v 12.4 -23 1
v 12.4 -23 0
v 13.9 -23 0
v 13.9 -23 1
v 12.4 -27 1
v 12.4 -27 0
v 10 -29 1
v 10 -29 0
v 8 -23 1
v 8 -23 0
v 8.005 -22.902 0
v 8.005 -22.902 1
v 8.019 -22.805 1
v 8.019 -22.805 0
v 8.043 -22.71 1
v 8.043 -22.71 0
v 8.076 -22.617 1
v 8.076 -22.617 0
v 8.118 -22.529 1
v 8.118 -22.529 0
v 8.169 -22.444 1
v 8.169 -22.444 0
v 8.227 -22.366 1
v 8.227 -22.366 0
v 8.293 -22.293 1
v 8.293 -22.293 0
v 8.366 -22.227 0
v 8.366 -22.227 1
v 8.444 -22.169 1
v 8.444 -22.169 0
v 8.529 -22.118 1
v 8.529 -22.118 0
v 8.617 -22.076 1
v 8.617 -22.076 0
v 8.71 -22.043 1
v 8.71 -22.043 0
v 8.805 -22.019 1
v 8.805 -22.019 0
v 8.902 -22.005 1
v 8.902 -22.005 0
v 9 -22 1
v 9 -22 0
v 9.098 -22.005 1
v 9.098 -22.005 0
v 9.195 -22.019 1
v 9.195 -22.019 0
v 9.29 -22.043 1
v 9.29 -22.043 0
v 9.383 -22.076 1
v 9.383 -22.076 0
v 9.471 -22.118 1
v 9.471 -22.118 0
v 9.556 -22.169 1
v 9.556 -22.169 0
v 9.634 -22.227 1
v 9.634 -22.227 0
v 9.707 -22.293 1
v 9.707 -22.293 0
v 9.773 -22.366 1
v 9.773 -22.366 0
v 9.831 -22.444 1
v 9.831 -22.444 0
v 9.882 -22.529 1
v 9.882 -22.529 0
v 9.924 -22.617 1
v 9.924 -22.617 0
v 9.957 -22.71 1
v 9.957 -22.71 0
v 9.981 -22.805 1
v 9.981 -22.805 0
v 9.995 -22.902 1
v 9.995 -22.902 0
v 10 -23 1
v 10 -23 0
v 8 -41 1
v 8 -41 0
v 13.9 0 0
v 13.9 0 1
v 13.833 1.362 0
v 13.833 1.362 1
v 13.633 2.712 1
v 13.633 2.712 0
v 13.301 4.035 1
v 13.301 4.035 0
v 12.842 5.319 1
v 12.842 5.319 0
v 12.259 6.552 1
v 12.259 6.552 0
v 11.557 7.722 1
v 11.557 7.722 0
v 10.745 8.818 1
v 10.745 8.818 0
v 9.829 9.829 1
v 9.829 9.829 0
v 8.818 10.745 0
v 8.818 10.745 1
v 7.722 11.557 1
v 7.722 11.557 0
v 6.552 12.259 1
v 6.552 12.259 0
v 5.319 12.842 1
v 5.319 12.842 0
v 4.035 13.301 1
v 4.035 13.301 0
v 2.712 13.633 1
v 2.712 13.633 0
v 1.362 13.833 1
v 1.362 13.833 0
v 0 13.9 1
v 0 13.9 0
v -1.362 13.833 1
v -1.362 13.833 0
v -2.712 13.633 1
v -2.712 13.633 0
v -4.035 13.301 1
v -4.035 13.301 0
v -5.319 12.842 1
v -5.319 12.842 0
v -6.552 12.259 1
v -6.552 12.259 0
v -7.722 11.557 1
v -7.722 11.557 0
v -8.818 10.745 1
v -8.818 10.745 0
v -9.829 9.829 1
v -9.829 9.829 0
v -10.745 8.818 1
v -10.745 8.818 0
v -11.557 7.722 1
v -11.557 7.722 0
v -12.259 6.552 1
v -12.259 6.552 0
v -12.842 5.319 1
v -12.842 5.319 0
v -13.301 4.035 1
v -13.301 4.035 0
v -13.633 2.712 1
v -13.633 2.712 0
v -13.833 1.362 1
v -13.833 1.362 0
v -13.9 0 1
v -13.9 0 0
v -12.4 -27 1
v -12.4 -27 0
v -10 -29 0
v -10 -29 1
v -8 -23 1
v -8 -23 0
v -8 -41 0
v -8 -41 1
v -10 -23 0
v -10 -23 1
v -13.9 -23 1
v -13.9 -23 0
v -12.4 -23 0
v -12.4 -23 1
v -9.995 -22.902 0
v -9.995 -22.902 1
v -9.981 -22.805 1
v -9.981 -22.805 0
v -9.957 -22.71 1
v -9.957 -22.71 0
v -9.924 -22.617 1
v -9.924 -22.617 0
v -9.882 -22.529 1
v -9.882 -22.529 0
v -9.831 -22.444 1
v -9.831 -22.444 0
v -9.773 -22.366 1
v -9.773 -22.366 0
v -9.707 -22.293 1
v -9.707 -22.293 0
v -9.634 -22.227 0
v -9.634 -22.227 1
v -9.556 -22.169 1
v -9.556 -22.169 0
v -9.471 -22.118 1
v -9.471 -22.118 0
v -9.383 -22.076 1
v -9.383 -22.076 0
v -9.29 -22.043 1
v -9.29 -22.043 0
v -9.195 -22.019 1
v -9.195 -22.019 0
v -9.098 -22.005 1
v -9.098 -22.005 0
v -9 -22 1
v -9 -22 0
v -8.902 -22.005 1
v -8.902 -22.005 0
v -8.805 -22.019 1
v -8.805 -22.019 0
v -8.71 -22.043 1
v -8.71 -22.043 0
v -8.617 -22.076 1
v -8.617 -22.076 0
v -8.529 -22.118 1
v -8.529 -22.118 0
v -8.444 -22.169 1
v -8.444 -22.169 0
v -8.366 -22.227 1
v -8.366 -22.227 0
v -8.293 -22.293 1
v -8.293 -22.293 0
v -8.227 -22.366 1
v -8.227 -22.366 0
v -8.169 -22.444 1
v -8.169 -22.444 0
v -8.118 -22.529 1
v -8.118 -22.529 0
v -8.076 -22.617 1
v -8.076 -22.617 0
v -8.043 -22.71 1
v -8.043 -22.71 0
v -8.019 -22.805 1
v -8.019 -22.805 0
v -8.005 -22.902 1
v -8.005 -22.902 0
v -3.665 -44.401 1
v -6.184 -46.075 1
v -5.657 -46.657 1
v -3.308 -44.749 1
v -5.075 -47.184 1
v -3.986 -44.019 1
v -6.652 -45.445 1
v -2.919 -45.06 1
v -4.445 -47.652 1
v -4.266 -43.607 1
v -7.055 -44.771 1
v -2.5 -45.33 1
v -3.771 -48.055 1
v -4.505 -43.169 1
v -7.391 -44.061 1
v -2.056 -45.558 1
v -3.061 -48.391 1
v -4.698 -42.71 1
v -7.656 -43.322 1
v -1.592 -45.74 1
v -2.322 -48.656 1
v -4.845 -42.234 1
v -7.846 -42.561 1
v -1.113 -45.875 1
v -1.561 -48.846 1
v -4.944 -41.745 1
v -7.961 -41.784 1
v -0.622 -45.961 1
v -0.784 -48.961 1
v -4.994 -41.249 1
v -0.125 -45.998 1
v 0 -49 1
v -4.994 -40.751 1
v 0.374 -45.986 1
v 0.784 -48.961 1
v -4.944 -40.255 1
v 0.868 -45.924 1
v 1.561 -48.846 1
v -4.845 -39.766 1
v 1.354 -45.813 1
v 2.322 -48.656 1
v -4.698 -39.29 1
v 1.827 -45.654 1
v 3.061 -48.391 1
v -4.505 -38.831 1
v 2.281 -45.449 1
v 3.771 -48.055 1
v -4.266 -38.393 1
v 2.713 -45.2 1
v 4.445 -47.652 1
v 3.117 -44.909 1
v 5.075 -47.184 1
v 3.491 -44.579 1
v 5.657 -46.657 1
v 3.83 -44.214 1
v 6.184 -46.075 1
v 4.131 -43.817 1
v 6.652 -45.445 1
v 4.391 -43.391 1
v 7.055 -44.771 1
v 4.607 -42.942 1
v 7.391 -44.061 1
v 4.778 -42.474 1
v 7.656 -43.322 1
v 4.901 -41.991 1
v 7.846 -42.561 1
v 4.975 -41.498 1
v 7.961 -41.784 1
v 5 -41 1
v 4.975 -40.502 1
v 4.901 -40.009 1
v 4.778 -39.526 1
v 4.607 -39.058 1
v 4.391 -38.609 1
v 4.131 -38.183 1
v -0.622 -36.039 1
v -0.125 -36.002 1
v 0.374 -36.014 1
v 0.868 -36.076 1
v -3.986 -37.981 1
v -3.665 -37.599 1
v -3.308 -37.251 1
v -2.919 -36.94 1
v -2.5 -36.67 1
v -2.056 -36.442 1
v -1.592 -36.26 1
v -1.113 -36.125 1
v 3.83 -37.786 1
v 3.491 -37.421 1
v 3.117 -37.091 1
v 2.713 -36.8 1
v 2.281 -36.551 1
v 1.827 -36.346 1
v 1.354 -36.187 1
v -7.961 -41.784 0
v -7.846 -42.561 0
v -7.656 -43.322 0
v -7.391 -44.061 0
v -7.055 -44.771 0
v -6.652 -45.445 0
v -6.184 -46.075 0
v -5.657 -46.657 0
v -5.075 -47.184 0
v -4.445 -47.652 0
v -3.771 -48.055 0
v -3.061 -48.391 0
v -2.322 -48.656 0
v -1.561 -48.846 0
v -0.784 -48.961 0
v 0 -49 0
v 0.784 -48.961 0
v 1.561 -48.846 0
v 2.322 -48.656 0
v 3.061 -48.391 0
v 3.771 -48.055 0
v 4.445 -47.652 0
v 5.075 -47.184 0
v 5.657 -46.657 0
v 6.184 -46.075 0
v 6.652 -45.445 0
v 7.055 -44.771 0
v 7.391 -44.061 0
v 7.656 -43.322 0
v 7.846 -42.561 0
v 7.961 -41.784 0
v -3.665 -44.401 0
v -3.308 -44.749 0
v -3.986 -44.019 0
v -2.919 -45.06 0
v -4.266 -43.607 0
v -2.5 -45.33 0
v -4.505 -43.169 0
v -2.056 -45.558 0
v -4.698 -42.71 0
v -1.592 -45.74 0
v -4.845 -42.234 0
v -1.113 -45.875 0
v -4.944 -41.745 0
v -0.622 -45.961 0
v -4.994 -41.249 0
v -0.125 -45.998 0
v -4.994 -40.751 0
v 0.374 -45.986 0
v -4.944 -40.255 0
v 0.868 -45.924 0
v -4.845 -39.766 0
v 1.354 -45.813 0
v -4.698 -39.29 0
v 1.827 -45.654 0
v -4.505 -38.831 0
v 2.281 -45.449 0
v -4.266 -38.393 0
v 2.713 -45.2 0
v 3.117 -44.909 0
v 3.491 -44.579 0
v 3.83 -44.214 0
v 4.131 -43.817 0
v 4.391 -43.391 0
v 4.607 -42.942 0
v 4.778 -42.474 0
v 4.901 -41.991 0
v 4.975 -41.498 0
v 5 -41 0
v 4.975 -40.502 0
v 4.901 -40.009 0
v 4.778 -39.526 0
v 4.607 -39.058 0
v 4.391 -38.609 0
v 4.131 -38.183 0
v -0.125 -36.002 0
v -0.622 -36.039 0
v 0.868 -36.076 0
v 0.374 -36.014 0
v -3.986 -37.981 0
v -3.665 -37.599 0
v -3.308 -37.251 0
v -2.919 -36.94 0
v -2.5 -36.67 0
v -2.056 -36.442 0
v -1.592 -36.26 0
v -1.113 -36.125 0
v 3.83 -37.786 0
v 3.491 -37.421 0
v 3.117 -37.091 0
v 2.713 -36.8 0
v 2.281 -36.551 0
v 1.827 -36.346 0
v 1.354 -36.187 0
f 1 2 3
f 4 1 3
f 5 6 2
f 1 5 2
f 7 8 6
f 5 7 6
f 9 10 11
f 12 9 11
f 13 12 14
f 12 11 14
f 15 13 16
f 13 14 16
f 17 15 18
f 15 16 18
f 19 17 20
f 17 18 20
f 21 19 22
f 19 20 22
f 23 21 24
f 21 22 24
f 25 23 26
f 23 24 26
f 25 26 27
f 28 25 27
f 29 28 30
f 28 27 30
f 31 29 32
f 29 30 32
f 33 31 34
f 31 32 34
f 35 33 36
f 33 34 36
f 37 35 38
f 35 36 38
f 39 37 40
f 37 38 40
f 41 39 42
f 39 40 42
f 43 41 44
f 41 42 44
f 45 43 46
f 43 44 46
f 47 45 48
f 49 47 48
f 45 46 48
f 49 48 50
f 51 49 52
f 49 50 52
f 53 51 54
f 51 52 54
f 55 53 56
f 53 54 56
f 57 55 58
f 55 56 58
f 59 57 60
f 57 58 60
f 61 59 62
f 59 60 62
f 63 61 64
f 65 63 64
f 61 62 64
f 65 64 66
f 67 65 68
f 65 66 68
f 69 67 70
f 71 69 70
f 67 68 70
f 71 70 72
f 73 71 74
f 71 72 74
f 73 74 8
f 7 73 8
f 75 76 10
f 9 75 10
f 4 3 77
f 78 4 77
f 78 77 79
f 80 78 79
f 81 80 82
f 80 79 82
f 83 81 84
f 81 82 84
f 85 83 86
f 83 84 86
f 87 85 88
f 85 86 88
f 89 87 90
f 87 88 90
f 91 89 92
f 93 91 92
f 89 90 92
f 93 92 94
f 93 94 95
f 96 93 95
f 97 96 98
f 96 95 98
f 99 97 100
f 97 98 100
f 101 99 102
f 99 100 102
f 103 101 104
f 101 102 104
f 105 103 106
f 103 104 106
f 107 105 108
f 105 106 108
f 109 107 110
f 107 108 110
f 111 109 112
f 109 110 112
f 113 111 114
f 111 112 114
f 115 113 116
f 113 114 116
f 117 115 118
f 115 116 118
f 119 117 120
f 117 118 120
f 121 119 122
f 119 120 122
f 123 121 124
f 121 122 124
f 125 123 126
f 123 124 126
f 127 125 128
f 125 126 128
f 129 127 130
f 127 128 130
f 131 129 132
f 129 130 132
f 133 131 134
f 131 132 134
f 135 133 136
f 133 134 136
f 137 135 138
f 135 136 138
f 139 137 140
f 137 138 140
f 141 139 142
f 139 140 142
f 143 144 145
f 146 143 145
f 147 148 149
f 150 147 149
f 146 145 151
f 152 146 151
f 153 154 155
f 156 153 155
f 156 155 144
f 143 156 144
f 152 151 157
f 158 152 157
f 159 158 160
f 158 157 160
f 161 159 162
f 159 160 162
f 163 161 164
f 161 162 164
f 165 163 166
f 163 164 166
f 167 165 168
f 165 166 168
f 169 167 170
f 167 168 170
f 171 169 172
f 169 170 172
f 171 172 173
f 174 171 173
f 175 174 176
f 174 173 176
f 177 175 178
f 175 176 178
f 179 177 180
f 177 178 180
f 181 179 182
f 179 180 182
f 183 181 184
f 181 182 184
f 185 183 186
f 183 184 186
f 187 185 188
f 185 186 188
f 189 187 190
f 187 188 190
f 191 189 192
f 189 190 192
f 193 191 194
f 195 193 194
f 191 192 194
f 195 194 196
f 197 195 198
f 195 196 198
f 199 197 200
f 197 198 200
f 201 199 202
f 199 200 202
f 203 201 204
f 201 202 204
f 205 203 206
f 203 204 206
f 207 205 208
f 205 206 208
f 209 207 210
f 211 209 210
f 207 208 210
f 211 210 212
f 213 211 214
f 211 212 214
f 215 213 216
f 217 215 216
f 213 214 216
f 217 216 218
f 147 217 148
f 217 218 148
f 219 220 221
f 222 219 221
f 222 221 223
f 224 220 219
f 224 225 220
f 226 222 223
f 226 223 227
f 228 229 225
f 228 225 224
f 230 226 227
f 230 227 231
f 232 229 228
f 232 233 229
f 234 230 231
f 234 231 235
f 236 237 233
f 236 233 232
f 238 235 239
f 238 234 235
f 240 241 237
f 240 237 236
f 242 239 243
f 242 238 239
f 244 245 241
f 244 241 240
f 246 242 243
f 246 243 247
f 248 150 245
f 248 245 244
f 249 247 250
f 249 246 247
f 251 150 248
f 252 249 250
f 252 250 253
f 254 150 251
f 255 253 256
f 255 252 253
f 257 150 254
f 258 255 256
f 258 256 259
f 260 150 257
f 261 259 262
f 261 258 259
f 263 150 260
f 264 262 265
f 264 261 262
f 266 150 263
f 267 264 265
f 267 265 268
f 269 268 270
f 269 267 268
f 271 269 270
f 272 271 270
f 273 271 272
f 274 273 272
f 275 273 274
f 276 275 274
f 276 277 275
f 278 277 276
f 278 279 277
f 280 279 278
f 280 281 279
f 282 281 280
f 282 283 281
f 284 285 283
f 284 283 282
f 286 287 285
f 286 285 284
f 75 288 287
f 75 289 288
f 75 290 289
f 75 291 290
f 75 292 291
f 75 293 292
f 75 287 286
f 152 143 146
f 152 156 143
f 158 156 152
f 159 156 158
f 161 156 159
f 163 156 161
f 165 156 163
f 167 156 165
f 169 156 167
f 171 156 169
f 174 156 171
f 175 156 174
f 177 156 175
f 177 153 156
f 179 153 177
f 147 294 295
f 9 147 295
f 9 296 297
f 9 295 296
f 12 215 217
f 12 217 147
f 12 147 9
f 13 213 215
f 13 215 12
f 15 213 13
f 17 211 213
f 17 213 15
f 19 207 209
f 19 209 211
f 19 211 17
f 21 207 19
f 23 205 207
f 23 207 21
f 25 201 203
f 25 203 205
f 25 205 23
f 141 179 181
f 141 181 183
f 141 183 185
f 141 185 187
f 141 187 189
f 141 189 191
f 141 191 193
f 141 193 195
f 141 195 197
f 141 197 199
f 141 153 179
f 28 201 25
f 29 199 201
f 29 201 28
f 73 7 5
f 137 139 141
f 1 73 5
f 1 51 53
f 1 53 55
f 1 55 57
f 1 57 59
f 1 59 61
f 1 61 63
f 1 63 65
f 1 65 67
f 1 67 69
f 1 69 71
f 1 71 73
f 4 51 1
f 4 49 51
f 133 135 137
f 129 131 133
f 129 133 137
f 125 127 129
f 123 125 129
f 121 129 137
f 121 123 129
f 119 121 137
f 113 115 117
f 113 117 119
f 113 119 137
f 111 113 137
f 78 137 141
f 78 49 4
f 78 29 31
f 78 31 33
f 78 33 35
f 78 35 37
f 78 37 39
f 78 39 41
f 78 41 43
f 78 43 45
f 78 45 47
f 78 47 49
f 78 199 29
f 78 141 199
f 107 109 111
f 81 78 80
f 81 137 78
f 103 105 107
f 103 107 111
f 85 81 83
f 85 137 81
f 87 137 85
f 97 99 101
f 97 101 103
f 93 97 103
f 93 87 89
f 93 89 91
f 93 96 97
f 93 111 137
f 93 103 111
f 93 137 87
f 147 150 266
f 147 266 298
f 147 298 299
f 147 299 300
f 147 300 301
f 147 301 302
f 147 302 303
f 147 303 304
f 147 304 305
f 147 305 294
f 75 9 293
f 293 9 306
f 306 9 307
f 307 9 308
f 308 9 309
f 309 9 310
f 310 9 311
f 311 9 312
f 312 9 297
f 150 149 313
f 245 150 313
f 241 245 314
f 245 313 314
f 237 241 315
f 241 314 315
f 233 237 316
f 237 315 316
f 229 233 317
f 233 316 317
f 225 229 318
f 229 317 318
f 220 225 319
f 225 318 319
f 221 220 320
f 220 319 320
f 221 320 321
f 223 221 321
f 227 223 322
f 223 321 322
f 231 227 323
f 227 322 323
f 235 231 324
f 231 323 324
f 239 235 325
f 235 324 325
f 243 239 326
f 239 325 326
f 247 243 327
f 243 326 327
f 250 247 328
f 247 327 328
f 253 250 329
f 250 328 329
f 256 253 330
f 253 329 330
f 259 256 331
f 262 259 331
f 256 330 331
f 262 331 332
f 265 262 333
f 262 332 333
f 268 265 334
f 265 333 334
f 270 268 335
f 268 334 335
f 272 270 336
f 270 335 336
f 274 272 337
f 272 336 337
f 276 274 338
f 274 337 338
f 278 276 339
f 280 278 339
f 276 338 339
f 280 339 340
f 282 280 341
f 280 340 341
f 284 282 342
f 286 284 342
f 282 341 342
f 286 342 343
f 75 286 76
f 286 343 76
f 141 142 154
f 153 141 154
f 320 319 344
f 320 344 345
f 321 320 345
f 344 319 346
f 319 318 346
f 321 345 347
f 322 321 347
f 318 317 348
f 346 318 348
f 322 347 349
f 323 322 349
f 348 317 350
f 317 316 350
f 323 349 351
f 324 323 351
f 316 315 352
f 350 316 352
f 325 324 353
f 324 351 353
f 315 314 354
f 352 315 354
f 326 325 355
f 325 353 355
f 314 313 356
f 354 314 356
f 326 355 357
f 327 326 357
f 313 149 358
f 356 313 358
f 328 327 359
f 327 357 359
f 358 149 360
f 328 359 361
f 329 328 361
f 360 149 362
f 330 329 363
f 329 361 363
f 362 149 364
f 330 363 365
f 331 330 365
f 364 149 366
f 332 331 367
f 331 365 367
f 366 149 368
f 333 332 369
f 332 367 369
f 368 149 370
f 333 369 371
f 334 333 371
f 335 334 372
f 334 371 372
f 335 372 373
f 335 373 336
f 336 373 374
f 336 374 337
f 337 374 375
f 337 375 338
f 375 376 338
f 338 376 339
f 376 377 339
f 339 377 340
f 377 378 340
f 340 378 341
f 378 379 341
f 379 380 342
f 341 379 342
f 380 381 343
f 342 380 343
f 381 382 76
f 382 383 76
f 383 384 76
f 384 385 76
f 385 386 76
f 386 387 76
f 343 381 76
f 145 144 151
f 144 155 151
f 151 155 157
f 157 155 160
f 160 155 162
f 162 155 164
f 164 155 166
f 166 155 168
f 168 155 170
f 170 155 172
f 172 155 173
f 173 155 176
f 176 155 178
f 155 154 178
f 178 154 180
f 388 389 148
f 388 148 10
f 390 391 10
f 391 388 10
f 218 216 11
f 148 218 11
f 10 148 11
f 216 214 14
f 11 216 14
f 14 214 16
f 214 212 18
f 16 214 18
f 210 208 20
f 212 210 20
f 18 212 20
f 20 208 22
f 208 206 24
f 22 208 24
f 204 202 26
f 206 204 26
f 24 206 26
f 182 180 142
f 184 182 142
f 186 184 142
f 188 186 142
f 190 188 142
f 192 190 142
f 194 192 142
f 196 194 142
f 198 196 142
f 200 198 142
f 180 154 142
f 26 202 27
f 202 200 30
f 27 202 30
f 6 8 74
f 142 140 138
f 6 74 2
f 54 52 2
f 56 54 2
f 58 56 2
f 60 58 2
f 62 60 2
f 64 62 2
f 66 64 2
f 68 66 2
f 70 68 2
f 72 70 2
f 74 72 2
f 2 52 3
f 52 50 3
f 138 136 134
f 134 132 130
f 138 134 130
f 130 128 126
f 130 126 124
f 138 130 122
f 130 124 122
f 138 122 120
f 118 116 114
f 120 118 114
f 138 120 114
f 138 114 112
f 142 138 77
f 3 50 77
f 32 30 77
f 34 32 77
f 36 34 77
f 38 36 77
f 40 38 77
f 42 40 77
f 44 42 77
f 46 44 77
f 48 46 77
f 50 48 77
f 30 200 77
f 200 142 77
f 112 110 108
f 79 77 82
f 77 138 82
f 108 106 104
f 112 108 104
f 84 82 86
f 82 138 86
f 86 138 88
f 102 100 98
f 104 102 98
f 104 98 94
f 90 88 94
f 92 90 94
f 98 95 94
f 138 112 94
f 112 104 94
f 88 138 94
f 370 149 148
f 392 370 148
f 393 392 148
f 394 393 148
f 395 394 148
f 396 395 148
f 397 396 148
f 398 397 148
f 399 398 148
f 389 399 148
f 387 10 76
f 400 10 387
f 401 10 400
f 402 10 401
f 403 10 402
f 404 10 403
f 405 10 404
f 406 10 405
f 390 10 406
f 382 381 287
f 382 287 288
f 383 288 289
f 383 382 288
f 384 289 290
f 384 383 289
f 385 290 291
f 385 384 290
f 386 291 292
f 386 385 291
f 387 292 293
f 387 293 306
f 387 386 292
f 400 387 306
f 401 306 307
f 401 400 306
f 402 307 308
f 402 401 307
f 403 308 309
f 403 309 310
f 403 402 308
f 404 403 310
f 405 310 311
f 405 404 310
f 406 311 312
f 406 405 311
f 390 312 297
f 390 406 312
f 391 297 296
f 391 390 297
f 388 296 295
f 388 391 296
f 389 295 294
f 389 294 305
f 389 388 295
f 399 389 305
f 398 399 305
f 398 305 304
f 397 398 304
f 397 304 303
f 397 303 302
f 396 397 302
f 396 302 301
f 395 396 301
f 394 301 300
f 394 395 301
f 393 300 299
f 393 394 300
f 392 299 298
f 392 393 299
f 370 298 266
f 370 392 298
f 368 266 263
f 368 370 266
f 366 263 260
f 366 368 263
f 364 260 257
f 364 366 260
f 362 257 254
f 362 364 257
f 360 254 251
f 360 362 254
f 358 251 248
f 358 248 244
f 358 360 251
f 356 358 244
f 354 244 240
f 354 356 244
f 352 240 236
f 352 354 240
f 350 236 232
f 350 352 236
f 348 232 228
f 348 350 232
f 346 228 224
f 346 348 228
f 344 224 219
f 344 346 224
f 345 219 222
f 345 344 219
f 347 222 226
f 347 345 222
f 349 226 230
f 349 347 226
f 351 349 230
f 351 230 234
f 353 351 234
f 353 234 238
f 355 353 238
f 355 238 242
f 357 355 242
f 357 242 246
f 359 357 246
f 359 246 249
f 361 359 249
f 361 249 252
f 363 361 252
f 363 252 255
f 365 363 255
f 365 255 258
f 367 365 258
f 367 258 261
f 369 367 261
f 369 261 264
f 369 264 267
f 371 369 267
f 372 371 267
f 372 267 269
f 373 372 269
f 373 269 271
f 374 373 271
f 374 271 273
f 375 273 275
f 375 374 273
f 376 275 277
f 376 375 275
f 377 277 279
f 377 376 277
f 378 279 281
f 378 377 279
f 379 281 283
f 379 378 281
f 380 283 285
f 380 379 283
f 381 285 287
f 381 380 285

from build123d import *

# Parameters (mm, degrees)
F0_R     = 5
F1_DEPTH = 1


with BuildPart() as f1:
    # F0 (on Top) → F1 (new body)
    with BuildSketch(Plane.XY):
        with BuildLine():
            Line((-12.4, -27), (-10, -29))
            Line((-10, -29), (-10, -23))
            ThreePointArc((-10, -23), (-9, -22), (-8, -23))
            Line((-8, -23), (-8, -41))
            ThreePointArc((-8, -41), (0, -49), (8, -41))
            Line((8, -41), (8, -23))
            ThreePointArc((8, -23), (9, -22), (10, -23))
            Line((10, -23), (10, -29))
            Line((10, -29), (12.4, -27))
            Line((12.4, -27), (12.4, -23))
            Line((12.4, -23), (13.9, -23))
            Line((13.9, -23), (13.9, 0))
            ThreePointArc((13.9, 0), (0, 13.9), (-13.9, 0))
            Line((-13.9, 0), (-13.9, -23))
            Line((-13.9, -23), (-12.4, -23))
            Line((-12.4, -23), (-12.4, -27))
        make_face()
        with Locations((0, -41)):
            Circle(F0_R, mode=Mode.SUBTRACT)
    extrude(amount=F1_DEPTH)


solid = f1.part
